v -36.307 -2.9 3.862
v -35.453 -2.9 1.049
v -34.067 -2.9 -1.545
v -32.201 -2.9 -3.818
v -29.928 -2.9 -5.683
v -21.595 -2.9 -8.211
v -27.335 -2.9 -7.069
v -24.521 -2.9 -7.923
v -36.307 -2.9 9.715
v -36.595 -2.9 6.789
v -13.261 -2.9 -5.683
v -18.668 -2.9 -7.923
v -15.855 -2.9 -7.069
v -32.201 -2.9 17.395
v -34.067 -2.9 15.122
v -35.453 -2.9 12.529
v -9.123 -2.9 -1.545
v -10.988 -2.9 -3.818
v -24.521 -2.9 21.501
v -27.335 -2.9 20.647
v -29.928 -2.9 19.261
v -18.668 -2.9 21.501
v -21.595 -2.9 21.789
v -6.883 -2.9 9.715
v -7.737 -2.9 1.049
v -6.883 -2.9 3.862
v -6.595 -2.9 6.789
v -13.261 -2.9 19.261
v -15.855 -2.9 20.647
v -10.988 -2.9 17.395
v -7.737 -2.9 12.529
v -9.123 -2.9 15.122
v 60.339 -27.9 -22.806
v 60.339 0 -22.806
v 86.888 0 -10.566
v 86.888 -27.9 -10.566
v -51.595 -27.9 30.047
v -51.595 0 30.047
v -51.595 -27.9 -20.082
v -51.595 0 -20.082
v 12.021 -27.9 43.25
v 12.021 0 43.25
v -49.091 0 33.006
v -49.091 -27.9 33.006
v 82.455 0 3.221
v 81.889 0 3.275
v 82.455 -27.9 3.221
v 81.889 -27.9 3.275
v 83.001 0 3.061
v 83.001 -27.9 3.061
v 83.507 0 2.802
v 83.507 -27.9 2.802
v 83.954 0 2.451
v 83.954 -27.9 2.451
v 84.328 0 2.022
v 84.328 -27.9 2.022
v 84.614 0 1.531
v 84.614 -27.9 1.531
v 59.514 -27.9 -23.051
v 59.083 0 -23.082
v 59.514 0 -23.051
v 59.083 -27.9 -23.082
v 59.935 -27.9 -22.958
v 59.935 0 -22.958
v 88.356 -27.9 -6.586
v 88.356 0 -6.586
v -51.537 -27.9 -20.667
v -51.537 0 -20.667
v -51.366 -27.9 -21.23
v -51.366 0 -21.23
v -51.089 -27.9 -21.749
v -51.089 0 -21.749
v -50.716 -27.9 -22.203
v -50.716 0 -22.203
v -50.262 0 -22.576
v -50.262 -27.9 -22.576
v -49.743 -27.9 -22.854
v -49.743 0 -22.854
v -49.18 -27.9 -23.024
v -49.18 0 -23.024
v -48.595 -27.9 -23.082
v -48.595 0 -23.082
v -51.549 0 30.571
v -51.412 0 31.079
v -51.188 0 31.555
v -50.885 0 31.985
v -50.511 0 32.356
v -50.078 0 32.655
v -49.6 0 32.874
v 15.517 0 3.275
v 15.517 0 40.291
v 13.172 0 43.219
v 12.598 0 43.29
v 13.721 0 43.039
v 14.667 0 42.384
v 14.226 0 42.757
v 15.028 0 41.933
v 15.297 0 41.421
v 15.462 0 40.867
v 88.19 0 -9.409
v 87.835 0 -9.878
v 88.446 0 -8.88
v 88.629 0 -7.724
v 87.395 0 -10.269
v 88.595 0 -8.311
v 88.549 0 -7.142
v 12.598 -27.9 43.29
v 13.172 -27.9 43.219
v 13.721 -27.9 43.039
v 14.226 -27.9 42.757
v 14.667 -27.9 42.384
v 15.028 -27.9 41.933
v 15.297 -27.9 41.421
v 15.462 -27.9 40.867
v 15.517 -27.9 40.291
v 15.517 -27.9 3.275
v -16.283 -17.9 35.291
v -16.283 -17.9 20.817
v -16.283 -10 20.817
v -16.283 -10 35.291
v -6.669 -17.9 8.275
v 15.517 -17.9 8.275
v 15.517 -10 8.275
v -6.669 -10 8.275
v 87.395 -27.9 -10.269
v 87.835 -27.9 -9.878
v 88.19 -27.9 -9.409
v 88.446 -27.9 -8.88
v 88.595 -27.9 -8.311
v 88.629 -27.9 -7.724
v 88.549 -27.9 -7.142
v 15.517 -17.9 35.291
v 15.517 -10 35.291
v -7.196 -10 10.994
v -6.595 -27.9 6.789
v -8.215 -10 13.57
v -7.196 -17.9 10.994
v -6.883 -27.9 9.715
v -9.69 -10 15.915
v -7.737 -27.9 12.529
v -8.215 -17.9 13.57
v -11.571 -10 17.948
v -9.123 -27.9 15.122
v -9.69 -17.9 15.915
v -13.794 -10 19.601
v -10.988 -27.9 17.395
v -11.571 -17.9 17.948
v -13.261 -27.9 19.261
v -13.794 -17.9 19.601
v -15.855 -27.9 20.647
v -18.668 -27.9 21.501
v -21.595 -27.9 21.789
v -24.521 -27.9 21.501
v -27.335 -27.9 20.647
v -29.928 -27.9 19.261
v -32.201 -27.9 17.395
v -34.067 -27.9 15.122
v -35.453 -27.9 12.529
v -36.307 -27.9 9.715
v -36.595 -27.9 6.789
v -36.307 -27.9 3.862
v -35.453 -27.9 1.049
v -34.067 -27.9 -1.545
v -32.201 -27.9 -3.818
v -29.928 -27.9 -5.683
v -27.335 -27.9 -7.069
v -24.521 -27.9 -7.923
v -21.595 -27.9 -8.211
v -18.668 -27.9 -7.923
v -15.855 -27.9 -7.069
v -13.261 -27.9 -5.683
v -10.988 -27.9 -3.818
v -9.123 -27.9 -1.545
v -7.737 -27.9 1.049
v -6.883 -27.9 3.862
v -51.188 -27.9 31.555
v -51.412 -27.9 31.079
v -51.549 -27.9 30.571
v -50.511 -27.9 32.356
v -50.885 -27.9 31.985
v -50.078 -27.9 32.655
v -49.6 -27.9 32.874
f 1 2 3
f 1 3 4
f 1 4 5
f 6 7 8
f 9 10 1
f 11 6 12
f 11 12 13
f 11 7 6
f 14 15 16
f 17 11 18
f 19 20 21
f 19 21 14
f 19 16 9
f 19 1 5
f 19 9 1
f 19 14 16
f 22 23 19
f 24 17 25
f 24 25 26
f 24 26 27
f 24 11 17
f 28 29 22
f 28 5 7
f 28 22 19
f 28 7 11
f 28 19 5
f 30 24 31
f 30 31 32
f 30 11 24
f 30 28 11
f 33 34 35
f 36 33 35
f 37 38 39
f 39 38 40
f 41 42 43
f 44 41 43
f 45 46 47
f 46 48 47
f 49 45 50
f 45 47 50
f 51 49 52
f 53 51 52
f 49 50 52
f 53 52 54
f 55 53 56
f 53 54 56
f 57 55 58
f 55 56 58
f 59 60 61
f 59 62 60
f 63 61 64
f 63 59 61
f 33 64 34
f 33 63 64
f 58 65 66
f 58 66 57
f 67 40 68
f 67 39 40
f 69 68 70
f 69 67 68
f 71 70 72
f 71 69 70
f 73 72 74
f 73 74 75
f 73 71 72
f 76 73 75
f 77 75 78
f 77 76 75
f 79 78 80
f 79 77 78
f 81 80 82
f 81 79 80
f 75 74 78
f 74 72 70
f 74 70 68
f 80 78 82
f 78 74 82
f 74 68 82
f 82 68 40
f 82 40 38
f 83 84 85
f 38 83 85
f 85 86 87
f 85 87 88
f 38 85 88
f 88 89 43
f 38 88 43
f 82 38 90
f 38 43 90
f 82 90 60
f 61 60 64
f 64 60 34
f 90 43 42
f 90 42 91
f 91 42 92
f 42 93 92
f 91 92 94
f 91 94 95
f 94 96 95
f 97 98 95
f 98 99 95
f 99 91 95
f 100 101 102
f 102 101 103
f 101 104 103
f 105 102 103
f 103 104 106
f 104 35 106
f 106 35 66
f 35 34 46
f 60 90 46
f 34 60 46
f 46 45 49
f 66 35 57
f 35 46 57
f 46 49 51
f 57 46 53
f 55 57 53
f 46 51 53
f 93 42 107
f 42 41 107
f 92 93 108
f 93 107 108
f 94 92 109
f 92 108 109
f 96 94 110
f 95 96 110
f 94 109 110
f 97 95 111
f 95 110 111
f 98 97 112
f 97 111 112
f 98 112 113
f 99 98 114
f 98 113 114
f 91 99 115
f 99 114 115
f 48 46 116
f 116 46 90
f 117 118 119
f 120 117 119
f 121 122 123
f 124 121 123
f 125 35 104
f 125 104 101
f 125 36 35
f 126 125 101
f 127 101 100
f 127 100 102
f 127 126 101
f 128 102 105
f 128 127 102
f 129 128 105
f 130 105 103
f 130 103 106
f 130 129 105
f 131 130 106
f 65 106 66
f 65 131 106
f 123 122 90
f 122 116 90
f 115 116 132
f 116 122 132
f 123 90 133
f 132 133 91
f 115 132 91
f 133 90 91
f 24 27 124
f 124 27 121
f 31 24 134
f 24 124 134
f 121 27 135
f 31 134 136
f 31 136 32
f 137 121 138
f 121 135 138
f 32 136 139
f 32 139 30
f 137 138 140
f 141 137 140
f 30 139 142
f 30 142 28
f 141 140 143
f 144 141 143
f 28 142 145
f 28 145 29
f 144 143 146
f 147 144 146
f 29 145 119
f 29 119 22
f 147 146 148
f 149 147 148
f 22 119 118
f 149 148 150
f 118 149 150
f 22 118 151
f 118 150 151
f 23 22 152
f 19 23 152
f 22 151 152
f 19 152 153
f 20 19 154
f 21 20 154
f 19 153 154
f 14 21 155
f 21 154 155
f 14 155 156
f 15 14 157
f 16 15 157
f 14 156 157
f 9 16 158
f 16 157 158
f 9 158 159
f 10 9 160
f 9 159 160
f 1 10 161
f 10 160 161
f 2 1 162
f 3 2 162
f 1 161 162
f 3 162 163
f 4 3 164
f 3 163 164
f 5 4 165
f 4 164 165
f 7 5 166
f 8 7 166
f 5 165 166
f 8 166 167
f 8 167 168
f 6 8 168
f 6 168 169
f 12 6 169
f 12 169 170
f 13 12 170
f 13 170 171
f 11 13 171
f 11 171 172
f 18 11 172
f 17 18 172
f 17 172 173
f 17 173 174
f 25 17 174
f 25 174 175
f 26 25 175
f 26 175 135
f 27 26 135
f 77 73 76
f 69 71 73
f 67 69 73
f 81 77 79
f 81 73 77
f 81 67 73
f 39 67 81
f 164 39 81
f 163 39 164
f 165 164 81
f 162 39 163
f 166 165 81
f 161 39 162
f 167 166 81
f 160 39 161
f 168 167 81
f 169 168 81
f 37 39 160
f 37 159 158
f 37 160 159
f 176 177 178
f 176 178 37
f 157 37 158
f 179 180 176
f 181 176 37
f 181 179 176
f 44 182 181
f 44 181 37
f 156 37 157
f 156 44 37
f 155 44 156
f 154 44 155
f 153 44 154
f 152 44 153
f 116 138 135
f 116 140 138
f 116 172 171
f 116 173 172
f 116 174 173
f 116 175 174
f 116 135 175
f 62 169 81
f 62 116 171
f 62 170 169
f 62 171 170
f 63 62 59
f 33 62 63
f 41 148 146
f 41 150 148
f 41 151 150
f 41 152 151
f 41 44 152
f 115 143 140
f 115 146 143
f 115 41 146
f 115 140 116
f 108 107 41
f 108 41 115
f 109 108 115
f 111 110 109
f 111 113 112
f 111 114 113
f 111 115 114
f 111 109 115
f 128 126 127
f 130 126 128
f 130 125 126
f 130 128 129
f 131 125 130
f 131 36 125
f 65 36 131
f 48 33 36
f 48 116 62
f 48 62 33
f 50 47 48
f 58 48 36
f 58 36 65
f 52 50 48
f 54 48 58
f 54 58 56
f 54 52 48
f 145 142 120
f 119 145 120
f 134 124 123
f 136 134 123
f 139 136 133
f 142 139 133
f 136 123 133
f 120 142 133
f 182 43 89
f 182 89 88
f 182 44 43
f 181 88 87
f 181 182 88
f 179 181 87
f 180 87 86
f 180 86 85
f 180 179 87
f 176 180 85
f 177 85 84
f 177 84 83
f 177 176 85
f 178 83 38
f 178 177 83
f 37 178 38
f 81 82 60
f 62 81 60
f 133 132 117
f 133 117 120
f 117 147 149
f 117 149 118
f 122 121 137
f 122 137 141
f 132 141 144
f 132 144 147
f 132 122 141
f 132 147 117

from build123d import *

# Parameters (mm, degrees)
F1_DEPTH = 27.9
F2_R     = 15
F3_DEPTH = 25
F4_R     = 3
F5_W     = 7.9
F5_H     = 27.016579
F6_DEPTH = 31.8


with BuildPart() as f1:
    # F0 (on Front) → F1 (new body)
    with BuildSketch(Plane.XZ):
        Polygon((15.517242, 43.836206), (-51.594831, 32.586209), (-51.594831, -23.081899), (59.741382, -23.081899), (89.612074, -9.310345), (83.809795, 3.274879), (15.517242, 3.274879), align=None)
    extrude(amount=F1_DEPTH)

    # F2 (on face) → F3 (cut)
    with BuildSketch(Plane.XZ.offset(27.9)):
        with Locations((-21.594828, 6.788793)):
            Circle(F2_R)
    extrude(amount=-F3_DEPTH, mode=Mode.SUBTRACT)

    # F4
    f4_edges = [f1.edges().sort_by_distance(p)[0] for p in [
        (15.517242, -13.95, 43.836206),
        (83.809795, -13.95, 3.274879),
        (89.612074, -13.95, -9.310345),
        (59.741382, -13.95, -23.081899),
        (-51.594831, -13.95, -23.081899),
        (-51.594831, -13.95, 32.586209),
    ]]
    fillet(f4_edges, radius=F4_R)

    # F5 (on face) → F6 (cut)
    with BuildSketch(Plane.YZ.offset(15.517242)):
        with Locations((-13.95, 21.783168)):
            Rectangle(F5_W, F5_H)
    extrude(amount=-F6_DEPTH, mode=Mode.SUBTRACT)


solid = f1.part
